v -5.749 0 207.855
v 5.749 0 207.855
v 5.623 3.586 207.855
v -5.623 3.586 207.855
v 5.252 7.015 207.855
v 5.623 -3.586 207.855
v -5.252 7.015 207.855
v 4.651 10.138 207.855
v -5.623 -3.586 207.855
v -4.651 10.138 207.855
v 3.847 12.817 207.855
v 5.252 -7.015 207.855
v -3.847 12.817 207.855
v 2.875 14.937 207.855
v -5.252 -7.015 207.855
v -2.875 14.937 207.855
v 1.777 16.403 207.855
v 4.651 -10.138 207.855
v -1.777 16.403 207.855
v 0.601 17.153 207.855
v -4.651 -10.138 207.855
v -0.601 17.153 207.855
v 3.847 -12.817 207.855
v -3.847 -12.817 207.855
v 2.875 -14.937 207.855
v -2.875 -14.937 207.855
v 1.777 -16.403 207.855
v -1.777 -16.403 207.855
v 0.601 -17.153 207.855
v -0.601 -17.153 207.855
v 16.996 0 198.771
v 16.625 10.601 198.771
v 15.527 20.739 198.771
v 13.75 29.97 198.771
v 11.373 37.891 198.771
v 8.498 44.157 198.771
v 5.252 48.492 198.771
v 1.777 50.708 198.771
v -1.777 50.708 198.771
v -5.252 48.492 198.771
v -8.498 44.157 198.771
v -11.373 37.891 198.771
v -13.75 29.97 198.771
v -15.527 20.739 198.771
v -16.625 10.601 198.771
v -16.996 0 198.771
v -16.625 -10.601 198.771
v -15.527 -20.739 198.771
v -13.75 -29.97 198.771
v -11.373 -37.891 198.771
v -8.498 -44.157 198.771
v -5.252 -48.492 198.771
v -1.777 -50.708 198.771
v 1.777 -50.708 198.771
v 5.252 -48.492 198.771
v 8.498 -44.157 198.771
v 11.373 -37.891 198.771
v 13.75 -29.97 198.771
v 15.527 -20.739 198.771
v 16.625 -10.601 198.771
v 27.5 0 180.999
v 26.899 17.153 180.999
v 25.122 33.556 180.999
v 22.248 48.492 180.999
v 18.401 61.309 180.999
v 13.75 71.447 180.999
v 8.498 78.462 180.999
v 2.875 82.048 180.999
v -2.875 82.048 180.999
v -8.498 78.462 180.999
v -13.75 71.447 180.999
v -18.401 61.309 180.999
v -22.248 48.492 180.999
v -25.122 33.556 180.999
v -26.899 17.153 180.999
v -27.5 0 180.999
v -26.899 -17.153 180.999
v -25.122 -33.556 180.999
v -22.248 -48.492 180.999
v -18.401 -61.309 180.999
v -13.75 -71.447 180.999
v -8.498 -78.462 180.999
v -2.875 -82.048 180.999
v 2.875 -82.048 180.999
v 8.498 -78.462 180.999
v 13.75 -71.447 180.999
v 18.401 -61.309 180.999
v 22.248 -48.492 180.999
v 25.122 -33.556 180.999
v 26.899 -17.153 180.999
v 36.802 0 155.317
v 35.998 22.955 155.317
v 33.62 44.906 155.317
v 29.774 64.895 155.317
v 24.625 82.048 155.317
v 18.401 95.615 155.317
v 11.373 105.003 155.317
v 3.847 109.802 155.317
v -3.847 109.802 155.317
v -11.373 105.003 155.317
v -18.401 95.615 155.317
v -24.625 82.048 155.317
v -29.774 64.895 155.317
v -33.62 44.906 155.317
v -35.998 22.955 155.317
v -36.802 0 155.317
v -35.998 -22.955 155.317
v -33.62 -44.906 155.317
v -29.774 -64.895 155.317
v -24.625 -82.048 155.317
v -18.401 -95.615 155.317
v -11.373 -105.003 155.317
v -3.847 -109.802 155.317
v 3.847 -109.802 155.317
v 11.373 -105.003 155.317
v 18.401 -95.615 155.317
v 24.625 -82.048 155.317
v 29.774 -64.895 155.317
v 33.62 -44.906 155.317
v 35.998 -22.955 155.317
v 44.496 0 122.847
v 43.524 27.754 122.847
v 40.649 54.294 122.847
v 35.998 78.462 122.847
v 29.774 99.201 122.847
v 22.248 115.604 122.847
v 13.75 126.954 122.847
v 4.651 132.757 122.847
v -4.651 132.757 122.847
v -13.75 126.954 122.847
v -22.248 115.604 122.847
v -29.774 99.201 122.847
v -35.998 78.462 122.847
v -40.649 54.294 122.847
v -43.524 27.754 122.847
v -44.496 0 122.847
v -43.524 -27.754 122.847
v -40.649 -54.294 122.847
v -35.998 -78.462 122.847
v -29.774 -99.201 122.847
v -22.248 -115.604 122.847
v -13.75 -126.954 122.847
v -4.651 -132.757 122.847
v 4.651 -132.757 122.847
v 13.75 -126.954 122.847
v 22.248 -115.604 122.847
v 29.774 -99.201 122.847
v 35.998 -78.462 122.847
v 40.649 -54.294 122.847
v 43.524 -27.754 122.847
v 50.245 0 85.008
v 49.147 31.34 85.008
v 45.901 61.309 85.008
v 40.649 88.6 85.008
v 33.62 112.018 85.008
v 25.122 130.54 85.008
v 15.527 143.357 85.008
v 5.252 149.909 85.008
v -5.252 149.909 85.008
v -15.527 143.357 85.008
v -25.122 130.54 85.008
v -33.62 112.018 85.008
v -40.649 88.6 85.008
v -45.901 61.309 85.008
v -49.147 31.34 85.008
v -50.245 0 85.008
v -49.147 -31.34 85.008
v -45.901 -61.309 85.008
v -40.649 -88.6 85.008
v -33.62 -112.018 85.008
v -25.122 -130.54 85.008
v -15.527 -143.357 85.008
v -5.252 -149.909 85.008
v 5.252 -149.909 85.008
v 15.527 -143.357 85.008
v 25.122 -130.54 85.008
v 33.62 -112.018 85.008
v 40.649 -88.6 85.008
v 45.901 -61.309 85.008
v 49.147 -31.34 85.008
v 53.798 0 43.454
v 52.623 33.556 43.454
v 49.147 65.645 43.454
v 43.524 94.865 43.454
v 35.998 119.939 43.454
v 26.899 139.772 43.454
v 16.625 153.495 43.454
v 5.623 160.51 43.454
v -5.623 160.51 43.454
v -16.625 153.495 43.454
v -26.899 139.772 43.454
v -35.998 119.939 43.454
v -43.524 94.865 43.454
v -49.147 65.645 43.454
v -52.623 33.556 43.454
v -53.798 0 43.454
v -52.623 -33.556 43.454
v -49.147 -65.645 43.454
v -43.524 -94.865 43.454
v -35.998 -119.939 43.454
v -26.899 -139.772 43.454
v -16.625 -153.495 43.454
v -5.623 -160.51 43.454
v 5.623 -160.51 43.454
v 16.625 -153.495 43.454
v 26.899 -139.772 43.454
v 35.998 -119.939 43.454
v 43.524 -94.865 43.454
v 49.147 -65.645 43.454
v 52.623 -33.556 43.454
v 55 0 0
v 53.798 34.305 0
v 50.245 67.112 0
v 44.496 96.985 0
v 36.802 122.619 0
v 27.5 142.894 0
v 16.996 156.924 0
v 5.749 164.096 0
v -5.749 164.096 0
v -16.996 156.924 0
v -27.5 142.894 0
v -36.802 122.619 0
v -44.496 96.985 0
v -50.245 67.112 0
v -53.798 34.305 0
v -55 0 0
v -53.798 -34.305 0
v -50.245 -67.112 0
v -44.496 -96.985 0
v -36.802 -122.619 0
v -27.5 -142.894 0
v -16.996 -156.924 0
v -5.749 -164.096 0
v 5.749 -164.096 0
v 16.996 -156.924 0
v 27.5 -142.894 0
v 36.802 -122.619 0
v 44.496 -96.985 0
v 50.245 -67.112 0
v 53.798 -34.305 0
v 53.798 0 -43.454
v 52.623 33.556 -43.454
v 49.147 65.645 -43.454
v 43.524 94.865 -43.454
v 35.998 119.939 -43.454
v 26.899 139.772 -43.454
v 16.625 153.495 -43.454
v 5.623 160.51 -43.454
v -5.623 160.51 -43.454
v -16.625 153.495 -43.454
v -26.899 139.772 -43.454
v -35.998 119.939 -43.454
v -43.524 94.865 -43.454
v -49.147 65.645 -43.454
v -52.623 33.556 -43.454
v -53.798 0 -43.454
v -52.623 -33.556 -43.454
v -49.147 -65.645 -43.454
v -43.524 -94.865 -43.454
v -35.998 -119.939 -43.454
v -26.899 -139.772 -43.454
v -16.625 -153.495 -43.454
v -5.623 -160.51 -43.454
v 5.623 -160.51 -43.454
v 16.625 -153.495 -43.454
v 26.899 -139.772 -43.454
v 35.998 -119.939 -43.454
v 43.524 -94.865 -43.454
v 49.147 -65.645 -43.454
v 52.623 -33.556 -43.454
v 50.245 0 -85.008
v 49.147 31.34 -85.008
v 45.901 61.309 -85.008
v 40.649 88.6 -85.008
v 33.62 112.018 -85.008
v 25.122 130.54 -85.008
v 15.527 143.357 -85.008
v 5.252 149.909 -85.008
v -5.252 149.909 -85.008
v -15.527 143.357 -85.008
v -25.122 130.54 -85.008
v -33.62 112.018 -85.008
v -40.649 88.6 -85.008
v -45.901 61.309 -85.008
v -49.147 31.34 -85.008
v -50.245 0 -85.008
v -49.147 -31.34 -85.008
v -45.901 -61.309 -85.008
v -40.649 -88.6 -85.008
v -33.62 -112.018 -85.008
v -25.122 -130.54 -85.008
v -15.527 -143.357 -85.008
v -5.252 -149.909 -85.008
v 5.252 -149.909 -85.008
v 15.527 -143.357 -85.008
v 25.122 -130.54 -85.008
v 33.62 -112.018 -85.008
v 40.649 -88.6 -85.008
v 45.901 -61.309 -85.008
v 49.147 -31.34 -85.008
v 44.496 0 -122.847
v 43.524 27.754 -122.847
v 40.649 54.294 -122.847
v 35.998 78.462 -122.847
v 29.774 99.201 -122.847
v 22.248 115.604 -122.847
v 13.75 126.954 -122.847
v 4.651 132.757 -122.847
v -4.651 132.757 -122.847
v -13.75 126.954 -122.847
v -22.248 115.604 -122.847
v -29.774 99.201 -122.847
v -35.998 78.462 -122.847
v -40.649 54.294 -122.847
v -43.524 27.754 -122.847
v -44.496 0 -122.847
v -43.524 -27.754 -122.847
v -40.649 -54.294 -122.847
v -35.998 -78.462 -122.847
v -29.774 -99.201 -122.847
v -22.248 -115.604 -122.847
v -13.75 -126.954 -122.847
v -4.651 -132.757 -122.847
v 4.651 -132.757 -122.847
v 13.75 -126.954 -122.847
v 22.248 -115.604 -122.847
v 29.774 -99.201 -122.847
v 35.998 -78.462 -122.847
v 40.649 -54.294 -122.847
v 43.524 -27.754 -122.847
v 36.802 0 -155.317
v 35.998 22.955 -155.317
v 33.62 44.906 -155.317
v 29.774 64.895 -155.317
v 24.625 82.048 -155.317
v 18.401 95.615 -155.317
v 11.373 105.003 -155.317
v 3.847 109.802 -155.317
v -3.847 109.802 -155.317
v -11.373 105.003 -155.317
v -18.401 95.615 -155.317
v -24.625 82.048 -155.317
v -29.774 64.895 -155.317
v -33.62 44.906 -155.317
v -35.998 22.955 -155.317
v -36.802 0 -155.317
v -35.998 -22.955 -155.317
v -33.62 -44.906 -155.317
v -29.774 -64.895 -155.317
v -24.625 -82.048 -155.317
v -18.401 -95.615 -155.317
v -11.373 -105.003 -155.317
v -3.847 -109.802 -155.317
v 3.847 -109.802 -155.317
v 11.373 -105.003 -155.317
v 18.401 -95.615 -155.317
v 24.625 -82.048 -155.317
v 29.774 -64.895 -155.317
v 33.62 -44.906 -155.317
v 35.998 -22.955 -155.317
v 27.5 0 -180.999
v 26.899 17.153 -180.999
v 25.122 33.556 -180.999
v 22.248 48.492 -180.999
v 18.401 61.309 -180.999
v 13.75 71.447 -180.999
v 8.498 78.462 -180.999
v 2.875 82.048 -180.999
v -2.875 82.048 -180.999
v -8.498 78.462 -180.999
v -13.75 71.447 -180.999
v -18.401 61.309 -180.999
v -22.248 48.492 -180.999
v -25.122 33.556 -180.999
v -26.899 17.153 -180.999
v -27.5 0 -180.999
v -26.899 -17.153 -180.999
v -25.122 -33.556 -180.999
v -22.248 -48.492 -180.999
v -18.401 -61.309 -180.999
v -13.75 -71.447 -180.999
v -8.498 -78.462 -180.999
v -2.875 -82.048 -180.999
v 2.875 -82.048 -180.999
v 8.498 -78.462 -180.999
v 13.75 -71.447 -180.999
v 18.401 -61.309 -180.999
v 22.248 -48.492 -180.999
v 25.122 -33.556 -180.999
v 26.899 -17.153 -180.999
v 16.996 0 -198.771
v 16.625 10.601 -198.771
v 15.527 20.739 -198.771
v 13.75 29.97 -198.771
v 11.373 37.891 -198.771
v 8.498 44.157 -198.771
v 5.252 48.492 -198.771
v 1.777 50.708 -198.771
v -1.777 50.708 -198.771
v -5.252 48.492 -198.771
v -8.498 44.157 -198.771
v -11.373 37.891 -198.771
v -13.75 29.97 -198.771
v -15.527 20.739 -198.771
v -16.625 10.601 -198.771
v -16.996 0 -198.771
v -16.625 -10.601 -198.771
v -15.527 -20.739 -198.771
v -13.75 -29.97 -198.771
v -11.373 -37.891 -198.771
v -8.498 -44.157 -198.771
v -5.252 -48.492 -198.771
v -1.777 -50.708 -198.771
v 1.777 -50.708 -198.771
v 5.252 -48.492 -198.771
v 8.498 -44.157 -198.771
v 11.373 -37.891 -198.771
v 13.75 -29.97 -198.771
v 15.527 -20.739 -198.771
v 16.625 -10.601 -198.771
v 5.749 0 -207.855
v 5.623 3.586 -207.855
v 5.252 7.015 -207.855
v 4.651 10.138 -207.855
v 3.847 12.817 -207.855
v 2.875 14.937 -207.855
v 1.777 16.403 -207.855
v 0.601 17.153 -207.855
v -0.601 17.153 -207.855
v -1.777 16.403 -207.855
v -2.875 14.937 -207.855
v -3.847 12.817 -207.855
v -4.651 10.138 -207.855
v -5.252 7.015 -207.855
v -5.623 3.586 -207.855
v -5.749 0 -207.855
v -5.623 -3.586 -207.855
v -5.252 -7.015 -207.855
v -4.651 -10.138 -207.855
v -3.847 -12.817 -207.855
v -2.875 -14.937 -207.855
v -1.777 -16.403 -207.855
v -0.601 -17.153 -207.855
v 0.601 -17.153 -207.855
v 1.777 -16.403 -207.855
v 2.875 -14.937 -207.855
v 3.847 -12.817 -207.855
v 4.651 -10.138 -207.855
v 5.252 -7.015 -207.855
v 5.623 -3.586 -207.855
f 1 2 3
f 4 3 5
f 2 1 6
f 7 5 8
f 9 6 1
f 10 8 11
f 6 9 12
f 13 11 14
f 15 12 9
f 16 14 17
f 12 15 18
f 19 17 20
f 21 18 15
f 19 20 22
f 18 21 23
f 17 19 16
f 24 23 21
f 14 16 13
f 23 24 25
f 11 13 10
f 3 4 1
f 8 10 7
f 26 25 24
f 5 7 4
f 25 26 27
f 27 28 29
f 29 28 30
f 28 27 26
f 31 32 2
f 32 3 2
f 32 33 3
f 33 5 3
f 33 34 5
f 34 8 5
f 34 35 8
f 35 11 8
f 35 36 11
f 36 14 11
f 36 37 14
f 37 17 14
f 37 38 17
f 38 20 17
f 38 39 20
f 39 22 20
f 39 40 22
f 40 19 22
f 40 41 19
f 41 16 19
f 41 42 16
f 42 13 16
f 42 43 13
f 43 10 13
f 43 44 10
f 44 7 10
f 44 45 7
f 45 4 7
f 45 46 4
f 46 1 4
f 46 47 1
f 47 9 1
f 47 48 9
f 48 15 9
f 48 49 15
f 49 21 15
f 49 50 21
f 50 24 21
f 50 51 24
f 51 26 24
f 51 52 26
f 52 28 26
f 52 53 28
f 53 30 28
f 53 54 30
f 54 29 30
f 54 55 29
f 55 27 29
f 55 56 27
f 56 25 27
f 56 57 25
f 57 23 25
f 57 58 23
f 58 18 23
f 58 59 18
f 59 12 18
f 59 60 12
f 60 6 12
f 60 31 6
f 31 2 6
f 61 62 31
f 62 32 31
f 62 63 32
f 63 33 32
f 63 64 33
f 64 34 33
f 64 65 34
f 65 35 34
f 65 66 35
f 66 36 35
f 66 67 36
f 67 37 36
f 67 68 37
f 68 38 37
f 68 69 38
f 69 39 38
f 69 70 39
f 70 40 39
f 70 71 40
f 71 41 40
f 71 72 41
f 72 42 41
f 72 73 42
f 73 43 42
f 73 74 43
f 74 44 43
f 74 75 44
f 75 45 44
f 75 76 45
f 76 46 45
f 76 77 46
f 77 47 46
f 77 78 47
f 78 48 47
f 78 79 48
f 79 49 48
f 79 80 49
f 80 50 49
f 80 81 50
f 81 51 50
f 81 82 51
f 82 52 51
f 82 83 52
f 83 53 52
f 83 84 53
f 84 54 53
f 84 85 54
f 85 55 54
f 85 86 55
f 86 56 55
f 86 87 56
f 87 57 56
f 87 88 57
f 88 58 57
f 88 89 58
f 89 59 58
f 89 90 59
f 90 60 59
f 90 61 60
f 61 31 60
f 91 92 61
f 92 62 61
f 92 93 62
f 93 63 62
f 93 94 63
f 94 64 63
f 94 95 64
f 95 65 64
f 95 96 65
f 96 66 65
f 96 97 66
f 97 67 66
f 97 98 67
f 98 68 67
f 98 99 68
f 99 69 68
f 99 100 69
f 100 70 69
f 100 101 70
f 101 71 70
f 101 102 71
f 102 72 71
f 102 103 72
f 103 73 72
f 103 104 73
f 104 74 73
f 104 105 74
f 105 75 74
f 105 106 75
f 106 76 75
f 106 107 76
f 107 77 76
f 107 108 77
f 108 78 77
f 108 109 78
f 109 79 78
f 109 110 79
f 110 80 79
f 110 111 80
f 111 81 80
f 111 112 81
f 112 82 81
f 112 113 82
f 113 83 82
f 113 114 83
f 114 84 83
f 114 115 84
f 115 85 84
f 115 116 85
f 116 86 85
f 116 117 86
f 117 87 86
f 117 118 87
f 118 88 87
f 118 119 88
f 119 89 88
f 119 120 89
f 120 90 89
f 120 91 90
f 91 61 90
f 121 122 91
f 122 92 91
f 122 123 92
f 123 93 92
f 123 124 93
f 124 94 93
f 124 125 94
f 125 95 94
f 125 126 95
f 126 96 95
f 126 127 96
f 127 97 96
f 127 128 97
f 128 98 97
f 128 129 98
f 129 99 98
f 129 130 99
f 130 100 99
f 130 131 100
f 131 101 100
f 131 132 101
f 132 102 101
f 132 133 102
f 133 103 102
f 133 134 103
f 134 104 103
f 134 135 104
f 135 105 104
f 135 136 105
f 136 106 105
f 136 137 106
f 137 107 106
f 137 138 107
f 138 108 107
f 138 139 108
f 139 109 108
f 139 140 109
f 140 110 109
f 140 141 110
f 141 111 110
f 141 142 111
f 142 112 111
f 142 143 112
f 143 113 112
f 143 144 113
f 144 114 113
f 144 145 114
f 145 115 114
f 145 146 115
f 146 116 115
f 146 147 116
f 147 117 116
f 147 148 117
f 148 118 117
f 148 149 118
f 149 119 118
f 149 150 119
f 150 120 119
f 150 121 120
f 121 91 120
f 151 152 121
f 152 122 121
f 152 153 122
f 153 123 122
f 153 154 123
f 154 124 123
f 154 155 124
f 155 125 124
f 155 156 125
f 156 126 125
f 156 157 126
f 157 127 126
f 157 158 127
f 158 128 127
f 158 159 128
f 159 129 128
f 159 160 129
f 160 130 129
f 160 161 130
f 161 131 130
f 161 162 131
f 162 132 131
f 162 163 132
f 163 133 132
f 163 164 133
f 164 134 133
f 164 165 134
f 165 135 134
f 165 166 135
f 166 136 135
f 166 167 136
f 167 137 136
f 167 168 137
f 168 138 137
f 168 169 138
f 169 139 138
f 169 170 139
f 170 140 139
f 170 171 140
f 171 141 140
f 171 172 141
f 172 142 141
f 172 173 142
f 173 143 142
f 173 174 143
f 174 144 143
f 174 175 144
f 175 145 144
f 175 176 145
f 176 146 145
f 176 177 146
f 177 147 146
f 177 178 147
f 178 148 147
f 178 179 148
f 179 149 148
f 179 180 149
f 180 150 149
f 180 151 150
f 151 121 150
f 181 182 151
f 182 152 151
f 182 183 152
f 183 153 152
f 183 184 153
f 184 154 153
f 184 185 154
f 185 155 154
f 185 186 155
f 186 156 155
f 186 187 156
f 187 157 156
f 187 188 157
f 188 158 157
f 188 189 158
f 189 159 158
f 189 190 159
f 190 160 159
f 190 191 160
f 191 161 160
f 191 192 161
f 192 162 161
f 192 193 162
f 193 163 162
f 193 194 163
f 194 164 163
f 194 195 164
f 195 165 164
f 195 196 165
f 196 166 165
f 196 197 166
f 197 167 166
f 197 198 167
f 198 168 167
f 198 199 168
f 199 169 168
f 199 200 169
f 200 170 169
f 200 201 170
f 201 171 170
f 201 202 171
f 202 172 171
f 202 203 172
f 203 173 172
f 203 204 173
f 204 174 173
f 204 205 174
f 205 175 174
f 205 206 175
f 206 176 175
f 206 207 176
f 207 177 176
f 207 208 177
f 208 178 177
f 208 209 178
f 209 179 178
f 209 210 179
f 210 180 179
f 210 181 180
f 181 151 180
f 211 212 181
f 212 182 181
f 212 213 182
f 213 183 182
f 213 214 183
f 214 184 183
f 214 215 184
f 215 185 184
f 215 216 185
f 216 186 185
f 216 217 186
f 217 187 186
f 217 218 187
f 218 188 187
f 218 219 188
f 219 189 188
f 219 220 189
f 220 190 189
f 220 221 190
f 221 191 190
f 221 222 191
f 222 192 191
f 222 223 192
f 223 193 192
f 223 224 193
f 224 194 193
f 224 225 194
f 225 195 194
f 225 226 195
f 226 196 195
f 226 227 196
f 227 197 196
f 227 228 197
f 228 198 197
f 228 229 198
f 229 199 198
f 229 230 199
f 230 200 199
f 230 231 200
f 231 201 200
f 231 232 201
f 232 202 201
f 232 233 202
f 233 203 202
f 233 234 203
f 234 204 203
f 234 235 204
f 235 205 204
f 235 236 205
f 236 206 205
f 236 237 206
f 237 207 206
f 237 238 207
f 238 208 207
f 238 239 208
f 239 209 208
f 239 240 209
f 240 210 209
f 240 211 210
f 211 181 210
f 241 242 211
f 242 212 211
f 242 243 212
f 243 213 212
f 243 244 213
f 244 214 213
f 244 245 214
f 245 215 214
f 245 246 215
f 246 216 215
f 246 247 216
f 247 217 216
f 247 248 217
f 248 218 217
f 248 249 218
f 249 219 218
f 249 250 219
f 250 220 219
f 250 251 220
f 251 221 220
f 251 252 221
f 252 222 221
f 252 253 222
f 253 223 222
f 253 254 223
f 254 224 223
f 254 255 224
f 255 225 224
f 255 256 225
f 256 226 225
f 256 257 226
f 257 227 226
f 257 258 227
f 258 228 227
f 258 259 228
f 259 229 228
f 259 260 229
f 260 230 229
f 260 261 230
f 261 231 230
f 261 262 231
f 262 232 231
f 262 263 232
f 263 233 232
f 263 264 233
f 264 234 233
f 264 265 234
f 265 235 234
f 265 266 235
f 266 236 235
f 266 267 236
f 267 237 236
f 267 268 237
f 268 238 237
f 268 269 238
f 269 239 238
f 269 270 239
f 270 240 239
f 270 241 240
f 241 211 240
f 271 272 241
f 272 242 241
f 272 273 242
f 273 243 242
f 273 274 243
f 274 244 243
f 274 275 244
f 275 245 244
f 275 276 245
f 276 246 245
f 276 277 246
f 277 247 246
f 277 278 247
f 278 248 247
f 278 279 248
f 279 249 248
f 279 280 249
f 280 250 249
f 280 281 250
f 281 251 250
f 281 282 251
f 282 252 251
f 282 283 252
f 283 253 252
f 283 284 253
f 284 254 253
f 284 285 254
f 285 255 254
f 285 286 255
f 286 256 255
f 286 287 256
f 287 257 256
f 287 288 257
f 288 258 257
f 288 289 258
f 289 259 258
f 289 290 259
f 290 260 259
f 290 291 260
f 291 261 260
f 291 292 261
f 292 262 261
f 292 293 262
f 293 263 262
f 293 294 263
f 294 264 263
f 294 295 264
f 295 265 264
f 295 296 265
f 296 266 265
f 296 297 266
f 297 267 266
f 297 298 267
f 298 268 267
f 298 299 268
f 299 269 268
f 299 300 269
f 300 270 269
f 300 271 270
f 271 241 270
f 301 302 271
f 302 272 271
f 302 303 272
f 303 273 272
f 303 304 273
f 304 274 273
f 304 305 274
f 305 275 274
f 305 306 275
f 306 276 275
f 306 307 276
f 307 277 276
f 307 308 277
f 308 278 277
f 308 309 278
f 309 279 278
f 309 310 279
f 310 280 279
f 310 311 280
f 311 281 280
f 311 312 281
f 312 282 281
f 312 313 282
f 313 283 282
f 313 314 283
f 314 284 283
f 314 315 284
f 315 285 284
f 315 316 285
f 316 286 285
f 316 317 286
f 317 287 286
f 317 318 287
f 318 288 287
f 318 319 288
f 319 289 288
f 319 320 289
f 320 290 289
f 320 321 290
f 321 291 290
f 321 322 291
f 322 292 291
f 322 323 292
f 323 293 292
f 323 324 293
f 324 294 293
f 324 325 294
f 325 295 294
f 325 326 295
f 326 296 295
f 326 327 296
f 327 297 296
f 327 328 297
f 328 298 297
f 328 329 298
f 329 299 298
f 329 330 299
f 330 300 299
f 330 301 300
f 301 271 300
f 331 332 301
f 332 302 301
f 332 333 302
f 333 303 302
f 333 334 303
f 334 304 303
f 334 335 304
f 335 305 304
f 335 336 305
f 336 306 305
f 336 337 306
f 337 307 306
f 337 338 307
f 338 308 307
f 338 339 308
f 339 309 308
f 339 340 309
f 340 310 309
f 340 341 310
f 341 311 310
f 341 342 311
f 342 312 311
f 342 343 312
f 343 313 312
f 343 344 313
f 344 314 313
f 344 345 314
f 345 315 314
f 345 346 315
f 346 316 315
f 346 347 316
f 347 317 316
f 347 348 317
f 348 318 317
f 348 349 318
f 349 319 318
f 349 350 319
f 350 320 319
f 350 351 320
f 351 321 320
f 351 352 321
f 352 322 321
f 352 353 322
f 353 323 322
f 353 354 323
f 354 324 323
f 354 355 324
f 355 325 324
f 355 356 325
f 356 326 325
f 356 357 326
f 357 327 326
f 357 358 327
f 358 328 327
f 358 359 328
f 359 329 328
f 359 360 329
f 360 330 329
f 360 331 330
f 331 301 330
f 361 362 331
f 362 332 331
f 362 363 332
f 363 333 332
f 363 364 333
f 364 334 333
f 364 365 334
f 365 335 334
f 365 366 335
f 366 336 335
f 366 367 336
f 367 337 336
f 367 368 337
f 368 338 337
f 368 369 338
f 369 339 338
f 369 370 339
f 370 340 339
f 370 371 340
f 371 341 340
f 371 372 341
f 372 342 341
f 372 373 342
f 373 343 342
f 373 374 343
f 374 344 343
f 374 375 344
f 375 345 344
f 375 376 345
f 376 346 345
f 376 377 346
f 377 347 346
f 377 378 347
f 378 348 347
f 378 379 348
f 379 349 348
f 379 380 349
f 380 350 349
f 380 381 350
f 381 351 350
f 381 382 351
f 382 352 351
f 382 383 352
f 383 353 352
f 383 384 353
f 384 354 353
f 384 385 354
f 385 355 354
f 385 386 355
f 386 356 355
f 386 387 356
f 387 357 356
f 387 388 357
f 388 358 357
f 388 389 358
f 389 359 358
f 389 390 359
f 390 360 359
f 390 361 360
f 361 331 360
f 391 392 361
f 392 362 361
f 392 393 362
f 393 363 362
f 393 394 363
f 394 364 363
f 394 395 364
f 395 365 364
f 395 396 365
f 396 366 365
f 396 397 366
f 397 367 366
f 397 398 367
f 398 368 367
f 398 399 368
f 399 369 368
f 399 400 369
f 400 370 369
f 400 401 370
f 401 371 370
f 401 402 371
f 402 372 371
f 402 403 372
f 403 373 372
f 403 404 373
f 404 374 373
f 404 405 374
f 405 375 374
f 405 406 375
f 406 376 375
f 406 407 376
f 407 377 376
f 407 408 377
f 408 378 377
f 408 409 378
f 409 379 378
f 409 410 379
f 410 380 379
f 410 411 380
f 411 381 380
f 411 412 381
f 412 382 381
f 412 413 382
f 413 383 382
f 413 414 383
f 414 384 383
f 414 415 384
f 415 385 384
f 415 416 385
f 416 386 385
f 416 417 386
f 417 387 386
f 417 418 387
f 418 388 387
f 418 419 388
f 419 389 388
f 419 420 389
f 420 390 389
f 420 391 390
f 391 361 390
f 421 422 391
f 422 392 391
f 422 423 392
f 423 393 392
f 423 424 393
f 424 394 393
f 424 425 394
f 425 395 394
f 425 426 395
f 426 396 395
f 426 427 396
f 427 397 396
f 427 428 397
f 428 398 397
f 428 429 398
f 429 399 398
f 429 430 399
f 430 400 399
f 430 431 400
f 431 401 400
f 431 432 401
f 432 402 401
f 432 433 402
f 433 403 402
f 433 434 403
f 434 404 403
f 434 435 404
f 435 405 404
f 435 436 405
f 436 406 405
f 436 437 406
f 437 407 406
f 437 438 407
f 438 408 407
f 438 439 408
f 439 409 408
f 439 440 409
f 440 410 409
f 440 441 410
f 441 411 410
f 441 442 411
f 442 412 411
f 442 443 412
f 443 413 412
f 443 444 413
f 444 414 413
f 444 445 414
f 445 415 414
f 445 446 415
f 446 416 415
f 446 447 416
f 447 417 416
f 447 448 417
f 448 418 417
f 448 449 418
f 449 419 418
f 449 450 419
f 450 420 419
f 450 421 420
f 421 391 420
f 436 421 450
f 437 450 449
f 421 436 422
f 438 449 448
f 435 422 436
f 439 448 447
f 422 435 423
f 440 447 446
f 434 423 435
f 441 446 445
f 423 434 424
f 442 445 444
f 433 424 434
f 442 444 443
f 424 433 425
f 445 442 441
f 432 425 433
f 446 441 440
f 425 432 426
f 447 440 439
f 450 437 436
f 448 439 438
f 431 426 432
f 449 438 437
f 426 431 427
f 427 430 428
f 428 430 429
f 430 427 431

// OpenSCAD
// Generated by SolidPython 1.0.1 on 2020-07-29 00:46:46


scale(v = [5, 15, 19]) {
	sphere(r = 11);
}
/***********************************************
*********      SolidPython code:      **********
************************************************
 
# import packages: SolidPython
from solid import *
from solid.utils import *
from itertools import chain, combinations, permutations


class Resize:

    def __init__(self, scad_file):
        self.scad_file = scad_file
        #self.scad_file = import_scad(scad_file)
        # cone/cylinder param:
        self.r1 = 0
        self.r2 = 0
        self.h = 0
        # rectangular prism param:
        self.w = 0
        self.l = 0
        # ellipse param:
        self.r = 0

    # import OpenScad code (file name corresponds to shape)


    # classify shape + parameters
    def assign(self, param1, param2, param3):
        if self.scad_file == 'cone.scad':
            self.r1 = param1
            self.r2 = param2
            self.h = param3
        elif self.scad_file == 'cylinder.scad':
            self.r1 = param1
            self.r2 = param2
            self.h = param3
        elif self.scad_file == 'rectangularPrism.scad':
            self.h = param1
            self.l = param2
            self.w = param3
        else:
            self.r = param1
            self.h = param2

    # resize parameters
    def iterate(self):
        x = range(3, 20, 2)
        i = 1
        if self.scad_file == 'cone.scad':
            tempList = list(permutations(x, 2))
            for temp in tempList:
                param1 = temp[0]
                param2 = temp[1]
                filepath = 'produced_scad_files/' + 'cone' + str(param1) + '_' + str(param2) + '_' + '.scad'
                scad_render_to_file(cylinder(h=param1, r1=param2, r2=0), filepath)

        elif self.scad_file == 'cylinder.scad':
            tempList = list(permutations(x, 3))
            for temp in tempList:
                param1 = temp[0]
                param2 = temp[1]
                filepath = 'produced_scad_files/' + 'cylinder' + str(param1) + '_' + str(param2) + '_' + '.scad'
                scad_render_to_file(cylinder(h=param1, r1=param2, r2=param2), filepath)

        elif self.scad_file == 'rectangularPrism.scad':
            tempList = list(permutations(x, 3))
            for temp in tempList:
                param1 = temp[0]
                param2 = temp[1]
                param3 = temp[2]
                filepath = 'produced_scad_files/' + 'rectangularPrism' + str(param1) + '_' + str(param2) + '_' + str(
                    param3) + '.scad'
                scad_render_to_file(cube(size=(param1, param2, param3)), filepath)

        elif self.scad_file == 'ellipse.scad':
            tempList = list(permutations(x, 4))
            for temp in tempList:
                param1 = temp[0]
                param2 = temp[1]
                param3 = temp[2]
                param4 = temp[3]
                filepath = 'produced_scad_files/' + 'ellipse' + str(param1) + '_' + str(param2) + '_' + str(param3) + '_' + str(param4) + '.scad'
                scad_render_to_file(scale([param1, param2, param3])(sphere(r=param4)), filepath)

    def render_to_scadfile(self):
        scad_render_to_file(scad, 'example.scad') 
 
************************************************/
